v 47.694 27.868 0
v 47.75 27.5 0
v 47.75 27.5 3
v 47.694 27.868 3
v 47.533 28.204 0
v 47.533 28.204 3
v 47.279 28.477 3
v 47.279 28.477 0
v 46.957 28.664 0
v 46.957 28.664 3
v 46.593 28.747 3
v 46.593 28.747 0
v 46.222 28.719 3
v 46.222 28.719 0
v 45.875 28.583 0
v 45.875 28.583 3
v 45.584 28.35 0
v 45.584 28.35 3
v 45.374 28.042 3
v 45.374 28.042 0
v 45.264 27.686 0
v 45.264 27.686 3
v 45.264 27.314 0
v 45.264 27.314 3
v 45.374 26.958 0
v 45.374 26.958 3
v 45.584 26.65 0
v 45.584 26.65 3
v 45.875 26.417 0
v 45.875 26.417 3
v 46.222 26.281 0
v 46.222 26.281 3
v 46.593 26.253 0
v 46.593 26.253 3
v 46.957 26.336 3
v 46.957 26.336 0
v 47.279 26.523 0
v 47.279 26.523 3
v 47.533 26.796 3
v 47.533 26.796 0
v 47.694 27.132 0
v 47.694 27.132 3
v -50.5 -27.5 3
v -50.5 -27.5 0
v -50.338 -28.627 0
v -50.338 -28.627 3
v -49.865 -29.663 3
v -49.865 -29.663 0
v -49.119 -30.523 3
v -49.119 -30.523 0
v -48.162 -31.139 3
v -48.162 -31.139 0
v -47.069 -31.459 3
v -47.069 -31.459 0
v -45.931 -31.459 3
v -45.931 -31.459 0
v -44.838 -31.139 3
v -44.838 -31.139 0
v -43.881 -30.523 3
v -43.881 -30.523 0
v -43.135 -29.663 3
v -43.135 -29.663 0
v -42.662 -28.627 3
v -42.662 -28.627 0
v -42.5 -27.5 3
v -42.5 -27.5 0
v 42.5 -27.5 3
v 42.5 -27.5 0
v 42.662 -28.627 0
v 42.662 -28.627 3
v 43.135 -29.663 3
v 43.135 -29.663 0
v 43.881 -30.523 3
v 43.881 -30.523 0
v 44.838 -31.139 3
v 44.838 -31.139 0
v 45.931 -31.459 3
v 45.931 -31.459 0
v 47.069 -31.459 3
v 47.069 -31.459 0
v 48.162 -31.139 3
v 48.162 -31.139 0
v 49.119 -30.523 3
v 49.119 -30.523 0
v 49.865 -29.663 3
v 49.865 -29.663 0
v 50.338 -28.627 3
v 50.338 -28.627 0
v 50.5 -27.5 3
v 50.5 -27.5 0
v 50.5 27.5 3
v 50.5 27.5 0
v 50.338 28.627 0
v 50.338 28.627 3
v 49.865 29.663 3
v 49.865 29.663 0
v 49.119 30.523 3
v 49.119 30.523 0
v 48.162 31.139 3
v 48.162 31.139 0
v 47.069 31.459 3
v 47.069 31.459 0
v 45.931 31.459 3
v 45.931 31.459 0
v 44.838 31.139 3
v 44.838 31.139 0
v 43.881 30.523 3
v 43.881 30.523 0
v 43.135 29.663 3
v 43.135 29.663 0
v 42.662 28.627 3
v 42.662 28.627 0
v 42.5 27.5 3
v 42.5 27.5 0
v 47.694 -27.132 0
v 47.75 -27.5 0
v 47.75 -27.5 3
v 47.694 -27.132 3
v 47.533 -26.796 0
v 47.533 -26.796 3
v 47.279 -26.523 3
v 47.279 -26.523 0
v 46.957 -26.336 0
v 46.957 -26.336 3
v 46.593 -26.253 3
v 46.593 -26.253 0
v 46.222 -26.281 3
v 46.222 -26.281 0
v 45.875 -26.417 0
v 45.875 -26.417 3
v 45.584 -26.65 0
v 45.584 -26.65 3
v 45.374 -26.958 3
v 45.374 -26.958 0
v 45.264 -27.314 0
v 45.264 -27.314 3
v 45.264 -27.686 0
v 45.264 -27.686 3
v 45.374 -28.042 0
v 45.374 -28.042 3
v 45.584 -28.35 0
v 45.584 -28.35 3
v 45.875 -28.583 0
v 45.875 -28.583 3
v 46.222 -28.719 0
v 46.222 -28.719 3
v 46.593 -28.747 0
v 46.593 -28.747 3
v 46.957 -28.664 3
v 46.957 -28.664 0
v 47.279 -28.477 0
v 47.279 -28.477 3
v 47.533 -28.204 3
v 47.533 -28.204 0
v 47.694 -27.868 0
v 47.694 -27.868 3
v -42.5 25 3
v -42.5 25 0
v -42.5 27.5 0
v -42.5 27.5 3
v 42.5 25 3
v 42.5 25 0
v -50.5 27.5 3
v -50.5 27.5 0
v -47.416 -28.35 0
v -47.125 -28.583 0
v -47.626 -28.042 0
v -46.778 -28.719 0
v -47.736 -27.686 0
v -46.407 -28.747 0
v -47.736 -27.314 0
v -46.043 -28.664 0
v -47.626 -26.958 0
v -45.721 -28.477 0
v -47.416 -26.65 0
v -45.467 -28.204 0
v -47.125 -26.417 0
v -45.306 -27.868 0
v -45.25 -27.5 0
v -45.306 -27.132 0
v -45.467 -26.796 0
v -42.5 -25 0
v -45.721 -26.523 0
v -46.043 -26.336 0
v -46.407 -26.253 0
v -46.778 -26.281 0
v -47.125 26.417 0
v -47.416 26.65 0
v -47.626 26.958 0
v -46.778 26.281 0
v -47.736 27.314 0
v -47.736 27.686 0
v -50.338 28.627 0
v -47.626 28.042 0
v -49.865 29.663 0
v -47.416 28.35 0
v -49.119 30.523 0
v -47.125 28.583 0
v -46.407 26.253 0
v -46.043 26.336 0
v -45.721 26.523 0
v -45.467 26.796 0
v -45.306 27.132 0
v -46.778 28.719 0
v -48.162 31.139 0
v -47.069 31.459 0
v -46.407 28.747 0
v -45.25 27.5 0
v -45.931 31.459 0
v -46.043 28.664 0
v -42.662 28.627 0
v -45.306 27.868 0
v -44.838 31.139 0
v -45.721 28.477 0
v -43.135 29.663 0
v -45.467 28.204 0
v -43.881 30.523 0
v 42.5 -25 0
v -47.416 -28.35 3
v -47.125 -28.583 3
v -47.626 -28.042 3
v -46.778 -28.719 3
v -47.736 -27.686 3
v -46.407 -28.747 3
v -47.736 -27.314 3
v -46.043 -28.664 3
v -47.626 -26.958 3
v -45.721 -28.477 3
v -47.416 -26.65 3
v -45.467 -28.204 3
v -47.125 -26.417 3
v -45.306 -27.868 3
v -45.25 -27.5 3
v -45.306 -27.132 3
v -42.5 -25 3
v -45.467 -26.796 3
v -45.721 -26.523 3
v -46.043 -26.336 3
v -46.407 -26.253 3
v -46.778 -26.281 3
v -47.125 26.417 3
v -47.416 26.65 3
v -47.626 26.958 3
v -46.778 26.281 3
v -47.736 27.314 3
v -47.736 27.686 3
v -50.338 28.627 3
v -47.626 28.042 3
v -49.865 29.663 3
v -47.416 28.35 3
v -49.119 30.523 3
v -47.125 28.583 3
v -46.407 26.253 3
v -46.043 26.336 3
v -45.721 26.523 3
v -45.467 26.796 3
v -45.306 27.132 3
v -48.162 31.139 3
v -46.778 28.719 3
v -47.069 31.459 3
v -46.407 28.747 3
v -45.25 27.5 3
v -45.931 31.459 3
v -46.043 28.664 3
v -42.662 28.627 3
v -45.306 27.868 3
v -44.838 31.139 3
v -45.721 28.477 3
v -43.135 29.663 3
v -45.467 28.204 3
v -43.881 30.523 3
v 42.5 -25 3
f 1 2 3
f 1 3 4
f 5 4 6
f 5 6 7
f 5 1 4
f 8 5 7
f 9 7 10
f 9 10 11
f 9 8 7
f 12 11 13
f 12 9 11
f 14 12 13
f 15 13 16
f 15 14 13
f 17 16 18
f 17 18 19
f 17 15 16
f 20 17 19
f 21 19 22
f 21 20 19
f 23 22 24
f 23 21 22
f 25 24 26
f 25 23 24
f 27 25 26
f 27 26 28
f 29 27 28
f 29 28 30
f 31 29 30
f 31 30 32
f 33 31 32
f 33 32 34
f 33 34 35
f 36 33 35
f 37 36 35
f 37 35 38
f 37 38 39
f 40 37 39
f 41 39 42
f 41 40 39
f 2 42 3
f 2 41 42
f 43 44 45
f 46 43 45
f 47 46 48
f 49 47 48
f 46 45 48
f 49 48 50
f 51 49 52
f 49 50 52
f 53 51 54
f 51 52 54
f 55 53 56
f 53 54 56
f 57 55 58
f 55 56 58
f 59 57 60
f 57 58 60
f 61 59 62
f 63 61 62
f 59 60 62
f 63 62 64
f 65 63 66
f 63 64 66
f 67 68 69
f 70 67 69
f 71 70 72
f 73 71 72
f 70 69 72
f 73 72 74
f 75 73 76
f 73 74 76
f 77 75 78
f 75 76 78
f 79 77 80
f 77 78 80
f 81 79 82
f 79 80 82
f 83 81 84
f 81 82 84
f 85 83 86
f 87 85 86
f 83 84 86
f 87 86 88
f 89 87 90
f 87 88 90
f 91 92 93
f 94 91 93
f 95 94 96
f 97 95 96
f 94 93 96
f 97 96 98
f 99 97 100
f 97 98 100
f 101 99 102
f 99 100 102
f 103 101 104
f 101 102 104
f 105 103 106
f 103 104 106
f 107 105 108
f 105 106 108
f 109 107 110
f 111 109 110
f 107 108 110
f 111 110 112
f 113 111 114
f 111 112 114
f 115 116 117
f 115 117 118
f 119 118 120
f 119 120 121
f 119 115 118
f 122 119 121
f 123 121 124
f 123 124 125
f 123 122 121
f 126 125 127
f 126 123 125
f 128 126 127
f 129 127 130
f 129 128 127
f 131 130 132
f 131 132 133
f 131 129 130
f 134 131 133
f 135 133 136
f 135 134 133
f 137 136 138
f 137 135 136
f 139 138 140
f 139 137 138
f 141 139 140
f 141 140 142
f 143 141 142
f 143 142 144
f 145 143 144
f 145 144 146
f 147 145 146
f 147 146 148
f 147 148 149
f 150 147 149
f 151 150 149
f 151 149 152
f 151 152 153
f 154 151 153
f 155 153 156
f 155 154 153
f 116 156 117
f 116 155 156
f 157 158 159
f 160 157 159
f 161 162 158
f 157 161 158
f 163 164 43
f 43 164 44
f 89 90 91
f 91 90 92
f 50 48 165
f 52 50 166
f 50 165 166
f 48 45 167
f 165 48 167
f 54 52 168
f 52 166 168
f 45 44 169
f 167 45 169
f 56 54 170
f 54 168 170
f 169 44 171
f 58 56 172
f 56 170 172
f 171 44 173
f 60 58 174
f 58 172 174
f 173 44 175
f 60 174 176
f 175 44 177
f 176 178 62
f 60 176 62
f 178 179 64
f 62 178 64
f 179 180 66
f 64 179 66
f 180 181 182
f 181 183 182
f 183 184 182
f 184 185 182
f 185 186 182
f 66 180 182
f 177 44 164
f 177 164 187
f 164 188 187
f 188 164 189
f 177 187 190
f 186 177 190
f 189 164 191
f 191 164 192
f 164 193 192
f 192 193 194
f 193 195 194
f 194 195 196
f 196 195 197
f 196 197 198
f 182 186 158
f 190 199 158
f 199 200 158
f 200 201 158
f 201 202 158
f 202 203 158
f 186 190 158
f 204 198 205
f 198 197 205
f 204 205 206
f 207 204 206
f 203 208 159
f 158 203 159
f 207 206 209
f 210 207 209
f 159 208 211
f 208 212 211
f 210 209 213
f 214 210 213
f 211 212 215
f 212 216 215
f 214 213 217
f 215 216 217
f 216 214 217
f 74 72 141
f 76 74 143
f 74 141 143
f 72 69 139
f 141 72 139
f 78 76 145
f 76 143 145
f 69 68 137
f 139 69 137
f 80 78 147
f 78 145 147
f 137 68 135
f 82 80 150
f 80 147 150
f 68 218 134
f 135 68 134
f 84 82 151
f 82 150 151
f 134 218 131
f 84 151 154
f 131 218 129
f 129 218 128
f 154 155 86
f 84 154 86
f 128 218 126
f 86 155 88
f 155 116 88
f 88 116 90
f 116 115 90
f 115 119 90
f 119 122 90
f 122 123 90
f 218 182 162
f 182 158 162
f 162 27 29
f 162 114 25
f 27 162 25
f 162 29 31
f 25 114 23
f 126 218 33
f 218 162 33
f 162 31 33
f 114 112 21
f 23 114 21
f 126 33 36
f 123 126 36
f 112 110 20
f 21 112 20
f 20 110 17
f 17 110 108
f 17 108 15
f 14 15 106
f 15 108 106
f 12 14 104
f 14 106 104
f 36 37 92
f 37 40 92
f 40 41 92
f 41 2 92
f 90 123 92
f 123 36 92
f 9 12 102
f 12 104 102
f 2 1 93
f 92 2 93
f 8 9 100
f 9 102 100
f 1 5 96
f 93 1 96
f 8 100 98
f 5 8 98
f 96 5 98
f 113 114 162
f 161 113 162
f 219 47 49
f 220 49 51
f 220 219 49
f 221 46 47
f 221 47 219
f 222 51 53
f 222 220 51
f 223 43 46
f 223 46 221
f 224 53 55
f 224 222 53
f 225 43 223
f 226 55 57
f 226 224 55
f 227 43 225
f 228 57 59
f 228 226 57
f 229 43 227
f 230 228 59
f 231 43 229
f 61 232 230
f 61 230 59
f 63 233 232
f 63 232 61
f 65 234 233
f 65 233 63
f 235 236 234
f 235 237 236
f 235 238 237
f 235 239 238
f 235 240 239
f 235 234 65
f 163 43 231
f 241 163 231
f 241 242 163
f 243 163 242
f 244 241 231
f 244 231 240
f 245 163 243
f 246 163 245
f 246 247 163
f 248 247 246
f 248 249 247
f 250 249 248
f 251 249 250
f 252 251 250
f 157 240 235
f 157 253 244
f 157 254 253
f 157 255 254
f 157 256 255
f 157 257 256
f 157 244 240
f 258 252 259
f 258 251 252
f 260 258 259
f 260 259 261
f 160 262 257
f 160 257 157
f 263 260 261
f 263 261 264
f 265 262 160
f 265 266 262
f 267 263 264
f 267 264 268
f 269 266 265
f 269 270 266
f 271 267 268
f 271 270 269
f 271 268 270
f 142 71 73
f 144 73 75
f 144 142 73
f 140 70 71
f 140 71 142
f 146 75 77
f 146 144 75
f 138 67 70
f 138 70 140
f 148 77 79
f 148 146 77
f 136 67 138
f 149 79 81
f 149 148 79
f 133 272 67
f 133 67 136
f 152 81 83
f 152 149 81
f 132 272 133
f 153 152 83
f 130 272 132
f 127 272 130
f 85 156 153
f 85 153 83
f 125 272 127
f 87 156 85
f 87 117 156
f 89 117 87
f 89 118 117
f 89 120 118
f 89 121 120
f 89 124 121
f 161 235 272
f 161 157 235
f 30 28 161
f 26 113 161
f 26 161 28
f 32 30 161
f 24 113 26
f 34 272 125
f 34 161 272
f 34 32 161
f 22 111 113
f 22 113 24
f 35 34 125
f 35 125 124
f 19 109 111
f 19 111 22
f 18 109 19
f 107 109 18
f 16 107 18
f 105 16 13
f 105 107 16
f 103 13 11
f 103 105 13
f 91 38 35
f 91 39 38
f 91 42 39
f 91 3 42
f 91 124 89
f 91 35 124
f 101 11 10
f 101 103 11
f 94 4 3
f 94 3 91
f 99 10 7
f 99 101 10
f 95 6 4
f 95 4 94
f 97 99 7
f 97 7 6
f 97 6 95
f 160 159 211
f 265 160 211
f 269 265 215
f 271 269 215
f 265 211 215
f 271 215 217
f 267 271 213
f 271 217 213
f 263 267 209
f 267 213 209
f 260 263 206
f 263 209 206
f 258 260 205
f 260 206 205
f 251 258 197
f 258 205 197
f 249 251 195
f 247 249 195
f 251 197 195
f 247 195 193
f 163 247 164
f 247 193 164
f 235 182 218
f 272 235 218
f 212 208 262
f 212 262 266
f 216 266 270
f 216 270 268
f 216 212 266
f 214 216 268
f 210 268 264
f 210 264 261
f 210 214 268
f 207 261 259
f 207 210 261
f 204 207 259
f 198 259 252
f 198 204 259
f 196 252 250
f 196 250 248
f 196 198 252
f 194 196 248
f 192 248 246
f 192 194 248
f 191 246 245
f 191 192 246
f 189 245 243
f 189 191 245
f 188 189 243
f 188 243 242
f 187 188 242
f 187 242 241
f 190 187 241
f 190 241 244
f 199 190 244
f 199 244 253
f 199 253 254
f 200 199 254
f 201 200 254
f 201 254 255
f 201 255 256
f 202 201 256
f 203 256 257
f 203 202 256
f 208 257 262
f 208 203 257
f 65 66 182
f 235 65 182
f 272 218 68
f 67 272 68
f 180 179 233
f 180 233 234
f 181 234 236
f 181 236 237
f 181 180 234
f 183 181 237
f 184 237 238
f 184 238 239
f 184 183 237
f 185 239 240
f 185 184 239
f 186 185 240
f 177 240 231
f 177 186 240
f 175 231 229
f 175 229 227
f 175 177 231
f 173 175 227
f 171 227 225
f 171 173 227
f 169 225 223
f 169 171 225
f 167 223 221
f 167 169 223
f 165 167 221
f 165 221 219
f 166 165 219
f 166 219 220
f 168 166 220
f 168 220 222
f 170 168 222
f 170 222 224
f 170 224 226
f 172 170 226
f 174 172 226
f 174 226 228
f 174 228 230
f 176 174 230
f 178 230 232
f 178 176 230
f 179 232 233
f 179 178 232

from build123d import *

# Parameters (mm, degrees)
SKETCH1_R           = 1.25
BOSS_EXTRUDE1_DEPTH = 3


with BuildPart() as part:
    # Sketch1 → Boss-Extrude1 (new body)
    with BuildSketch(Plane.XY):
        with BuildLine():
            Line((-42.5, -27.5), (-42.5, -25))
            Line((-42.5, -25), (42.5, -25))
            Line((42.5, -25), (42.5, -27.5))
            ThreePointArc((42.5, -27.5), (46.5, -31.5), (50.5, -27.5))
            Line((50.5, -27.5), (50.5, -25))
            Line((50.5, -25), (50.5, 25))
            Line((50.5, 25), (50.5, 27.5))
            ThreePointArc((50.5, 27.5), (46.5, 31.5), (42.5, 27.5))
            Line((42.5, 27.5), (42.5, 25))
            Line((42.5, 25), (-42.5, 25))
            Line((-42.5, 25), (-42.5, 27.5))
            ThreePointArc((-42.5, 27.5), (-46.5, 31.5), (-50.5, 27.5))
            Line((-50.5, 27.5), (-50.5, 25))
            Line((-50.5, 25), (-50.5, -25))
            Line((-50.5, -25), (-50.5, -27.5))
            ThreePointArc((-50.5, -27.5), (-46.5, -31.5), (-42.5, -27.5))
        make_face()
        with Locations((-46.5, 27.5)):
            Circle(SKETCH1_R, mode=Mode.SUBTRACT)
        with Locations((46.5, 27.5)):
            Circle(SKETCH1_R, mode=Mode.SUBTRACT)
        with Locations((46.5, -27.5)):
            Circle(SKETCH1_R, mode=Mode.SUBTRACT)
        with Locations((-46.5, -27.5)):
            Circle(SKETCH1_R, mode=Mode.SUBTRACT)
    extrude(amount=BOSS_EXTRUDE1_DEPTH)


solid = part.part
